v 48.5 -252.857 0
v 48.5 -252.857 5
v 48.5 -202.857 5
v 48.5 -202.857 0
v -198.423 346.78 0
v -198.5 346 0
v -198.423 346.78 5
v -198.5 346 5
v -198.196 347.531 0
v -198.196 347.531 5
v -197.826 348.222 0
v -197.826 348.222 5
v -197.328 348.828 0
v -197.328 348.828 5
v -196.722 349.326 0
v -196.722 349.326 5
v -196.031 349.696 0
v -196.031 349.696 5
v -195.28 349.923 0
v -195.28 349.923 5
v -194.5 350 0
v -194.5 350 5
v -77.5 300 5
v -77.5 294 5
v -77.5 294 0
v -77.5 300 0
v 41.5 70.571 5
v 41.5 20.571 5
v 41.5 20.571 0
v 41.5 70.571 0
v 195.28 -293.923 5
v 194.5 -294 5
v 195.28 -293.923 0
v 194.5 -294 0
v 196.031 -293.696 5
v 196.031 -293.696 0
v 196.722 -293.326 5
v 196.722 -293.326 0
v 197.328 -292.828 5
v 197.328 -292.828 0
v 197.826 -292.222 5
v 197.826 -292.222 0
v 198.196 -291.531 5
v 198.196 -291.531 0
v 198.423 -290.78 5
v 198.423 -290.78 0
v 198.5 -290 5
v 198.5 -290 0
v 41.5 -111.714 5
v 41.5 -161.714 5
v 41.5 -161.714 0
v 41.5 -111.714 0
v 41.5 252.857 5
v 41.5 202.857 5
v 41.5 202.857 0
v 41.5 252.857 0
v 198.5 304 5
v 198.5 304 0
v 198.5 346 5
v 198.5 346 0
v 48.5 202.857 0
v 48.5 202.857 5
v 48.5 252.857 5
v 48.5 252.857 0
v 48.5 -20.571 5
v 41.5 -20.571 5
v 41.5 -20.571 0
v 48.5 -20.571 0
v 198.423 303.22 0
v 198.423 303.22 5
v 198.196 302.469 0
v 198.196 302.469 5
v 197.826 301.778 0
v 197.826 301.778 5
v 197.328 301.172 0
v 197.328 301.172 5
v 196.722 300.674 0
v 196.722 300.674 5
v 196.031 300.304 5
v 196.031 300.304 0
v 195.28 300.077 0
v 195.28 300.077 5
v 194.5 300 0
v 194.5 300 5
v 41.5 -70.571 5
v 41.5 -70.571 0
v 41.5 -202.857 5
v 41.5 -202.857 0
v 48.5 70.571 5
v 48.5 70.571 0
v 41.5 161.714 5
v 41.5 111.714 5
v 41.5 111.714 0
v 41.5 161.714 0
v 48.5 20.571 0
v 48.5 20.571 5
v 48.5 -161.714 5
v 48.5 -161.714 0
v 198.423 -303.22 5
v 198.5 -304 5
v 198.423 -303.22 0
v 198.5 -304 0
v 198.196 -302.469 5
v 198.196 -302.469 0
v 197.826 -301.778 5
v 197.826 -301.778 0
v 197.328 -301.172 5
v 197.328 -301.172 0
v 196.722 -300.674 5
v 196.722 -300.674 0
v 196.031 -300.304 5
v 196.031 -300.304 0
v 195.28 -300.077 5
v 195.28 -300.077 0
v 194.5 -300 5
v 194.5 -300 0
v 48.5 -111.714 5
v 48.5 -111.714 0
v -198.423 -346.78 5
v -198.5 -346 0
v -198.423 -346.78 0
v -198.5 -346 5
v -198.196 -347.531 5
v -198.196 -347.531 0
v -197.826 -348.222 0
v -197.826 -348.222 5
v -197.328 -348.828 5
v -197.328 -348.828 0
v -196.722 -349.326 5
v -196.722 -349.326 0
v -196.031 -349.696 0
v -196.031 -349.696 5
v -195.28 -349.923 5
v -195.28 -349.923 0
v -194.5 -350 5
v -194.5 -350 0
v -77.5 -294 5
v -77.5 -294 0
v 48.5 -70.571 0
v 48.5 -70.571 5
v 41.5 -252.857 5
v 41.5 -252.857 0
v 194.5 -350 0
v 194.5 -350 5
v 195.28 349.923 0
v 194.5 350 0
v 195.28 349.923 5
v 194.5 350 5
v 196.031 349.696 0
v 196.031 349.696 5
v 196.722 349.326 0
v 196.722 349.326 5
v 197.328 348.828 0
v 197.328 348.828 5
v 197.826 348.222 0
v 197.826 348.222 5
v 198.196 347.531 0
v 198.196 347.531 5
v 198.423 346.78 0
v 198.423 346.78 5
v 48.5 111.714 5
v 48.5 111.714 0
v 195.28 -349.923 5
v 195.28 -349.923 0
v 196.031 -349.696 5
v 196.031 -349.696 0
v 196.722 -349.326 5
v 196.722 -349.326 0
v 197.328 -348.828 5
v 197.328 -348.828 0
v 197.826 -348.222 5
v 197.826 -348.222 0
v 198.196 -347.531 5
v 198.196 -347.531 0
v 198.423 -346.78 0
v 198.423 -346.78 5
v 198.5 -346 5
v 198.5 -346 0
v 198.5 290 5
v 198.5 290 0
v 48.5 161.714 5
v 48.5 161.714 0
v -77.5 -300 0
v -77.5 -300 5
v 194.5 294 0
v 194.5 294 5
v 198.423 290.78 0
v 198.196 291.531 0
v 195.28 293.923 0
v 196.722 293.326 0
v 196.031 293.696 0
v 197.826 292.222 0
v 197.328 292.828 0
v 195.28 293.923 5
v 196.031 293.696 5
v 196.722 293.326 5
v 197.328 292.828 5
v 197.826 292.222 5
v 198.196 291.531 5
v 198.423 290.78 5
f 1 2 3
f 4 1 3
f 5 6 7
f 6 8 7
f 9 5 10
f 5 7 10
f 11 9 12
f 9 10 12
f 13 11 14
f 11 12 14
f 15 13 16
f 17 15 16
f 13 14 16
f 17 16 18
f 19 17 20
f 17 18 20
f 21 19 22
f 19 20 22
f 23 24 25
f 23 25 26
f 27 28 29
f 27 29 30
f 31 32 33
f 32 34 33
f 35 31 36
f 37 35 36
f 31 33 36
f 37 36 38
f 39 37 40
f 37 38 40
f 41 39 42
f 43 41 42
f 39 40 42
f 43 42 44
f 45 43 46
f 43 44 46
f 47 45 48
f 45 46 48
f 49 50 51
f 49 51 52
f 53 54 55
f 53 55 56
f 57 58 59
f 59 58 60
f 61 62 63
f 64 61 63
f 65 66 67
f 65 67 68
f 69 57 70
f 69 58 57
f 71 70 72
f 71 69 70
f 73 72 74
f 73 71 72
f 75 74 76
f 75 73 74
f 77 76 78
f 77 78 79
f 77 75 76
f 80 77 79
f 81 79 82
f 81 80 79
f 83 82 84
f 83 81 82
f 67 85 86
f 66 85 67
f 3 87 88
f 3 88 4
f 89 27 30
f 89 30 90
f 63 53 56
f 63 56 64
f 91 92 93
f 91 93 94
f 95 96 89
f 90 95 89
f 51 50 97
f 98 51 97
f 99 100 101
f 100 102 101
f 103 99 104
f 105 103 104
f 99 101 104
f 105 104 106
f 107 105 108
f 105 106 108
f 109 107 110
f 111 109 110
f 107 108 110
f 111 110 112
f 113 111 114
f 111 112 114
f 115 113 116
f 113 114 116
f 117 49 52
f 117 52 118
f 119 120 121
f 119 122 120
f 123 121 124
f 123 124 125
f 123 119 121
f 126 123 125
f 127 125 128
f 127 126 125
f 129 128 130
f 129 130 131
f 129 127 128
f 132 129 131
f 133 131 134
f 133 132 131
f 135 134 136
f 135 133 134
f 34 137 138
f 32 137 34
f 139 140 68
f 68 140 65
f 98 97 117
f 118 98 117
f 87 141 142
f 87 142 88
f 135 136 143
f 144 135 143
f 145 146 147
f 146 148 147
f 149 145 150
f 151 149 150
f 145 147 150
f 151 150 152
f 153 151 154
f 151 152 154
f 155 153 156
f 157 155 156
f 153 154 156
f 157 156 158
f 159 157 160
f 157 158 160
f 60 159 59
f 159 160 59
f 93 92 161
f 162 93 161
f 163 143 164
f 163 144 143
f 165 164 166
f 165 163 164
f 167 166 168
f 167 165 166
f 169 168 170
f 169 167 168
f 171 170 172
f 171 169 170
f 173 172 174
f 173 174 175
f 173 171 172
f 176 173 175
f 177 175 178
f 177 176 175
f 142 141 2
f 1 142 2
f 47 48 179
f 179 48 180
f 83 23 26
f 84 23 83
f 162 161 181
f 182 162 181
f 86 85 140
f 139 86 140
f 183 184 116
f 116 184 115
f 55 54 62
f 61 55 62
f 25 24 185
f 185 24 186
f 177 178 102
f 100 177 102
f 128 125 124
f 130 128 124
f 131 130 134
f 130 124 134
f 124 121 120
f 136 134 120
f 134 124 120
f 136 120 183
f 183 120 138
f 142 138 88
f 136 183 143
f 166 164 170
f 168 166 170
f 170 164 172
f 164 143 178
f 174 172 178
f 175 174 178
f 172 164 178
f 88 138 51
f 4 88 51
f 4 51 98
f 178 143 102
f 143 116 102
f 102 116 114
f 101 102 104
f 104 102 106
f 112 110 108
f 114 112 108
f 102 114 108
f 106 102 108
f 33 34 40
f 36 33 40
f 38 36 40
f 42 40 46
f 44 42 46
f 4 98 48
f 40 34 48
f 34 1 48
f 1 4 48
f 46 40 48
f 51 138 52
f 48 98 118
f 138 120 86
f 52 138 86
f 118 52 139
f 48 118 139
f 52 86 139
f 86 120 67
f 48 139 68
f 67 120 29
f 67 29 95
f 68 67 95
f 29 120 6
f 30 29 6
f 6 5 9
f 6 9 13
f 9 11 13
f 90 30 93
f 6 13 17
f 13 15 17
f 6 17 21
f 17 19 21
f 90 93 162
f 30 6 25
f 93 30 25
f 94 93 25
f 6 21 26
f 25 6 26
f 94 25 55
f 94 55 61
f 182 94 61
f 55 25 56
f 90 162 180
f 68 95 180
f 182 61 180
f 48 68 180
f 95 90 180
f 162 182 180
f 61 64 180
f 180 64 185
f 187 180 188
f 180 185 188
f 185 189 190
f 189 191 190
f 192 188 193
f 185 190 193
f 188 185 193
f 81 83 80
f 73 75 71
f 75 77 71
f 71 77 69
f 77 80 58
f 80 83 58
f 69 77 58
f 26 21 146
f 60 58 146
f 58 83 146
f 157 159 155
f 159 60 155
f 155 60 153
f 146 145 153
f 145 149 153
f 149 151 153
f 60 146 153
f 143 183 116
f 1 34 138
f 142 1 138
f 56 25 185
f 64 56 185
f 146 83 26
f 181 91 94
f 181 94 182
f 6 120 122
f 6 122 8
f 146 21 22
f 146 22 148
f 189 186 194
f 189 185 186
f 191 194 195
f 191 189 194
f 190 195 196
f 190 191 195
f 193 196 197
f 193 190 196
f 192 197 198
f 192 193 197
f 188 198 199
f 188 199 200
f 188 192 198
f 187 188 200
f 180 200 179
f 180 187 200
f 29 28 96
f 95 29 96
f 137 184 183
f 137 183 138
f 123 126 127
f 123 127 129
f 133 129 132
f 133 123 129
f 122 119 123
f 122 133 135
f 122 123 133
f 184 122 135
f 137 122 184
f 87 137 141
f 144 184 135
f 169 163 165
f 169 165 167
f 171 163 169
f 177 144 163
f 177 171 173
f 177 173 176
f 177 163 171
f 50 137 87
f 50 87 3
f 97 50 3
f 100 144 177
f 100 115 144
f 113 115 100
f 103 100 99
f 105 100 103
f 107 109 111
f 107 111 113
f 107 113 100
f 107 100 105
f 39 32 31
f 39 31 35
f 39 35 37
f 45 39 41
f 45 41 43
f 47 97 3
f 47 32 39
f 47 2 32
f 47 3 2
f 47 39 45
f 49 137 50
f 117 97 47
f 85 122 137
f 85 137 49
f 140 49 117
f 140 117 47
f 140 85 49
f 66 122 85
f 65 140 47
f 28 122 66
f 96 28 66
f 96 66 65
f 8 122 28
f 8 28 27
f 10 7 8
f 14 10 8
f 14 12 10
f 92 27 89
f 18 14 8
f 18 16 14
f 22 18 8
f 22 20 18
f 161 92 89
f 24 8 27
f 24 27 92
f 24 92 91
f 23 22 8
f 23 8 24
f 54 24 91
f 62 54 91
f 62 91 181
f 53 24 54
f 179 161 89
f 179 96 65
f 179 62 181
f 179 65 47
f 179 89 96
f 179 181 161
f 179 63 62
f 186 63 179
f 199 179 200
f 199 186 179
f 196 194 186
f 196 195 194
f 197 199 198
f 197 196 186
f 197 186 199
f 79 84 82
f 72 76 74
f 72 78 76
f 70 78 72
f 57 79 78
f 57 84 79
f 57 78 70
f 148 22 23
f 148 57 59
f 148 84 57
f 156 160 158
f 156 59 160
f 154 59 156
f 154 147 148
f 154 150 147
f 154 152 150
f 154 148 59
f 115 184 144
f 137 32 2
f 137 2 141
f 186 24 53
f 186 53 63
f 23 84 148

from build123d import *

# Parameters (mm, degrees)
F0_W     = 397
F0_H     = 700
F1_DEPTH = 5
F2_W     = 276
F2_H     = 6
F3_DEPTH = 25
F4_W     = 7
F4_H     = 50
F5_DEPTH = 25
F6_R     = 4


with BuildPart() as f1:
    # F0 (on Top) → F1 (new body)
    with BuildSketch(Plane.XY):
        Rectangle(F0_W, F0_H)
    extrude(amount=F1_DEPTH)

    # F2 (on face) → F3 (cut)
    with BuildSketch(Plane.XY.offset(5)):
        with Locations((60.5, -297)):
            Rectangle(F2_W, F2_H)
        with Locations((60.5, 297)):
            Rectangle(F2_W, F2_H)
    extrude(amount=-F3_DEPTH, mode=Mode.SUBTRACT)

    # F4 (on face) → F5 (cut)
    with BuildSketch(Plane.XY.offset(5)):
        with Locations((45, 45.5714285714)):
            Rectangle(F4_W, F4_H)
        with Locations((45, 136.7142857143)):
            Rectangle(F4_W, F4_H)
        with Locations((45, 227.8571428571)):
            Rectangle(F4_W, F4_H)
        with Locations((45, -45.5714285714)):
            Rectangle(F4_W, F4_H)
        with Locations((45, -136.7142857143)):
            Rectangle(F4_W, F4_H)
        with Locations((45, -227.8571428571)):
            Rectangle(F4_W, F4_H)
    extrude(amount=-F5_DEPTH, mode=Mode.SUBTRACT)

    # F6
    f6_edges = [f1.edges().sort_by_distance(p)[0] for p in [
        (-198.5, -350, 2.5),
        (198.5, -350, 2.5),
        (198.5, -300, 2.5),
        (198.5, -294, 2.5),
        (198.5, 294, 2.5),
        (198.5, 300, 2.5),
        (198.5, 350, 2.5),
        (-198.5, 350, 2.5),
    ]]
    fillet(f6_edges, radius=F6_R)


solid = f1.part
